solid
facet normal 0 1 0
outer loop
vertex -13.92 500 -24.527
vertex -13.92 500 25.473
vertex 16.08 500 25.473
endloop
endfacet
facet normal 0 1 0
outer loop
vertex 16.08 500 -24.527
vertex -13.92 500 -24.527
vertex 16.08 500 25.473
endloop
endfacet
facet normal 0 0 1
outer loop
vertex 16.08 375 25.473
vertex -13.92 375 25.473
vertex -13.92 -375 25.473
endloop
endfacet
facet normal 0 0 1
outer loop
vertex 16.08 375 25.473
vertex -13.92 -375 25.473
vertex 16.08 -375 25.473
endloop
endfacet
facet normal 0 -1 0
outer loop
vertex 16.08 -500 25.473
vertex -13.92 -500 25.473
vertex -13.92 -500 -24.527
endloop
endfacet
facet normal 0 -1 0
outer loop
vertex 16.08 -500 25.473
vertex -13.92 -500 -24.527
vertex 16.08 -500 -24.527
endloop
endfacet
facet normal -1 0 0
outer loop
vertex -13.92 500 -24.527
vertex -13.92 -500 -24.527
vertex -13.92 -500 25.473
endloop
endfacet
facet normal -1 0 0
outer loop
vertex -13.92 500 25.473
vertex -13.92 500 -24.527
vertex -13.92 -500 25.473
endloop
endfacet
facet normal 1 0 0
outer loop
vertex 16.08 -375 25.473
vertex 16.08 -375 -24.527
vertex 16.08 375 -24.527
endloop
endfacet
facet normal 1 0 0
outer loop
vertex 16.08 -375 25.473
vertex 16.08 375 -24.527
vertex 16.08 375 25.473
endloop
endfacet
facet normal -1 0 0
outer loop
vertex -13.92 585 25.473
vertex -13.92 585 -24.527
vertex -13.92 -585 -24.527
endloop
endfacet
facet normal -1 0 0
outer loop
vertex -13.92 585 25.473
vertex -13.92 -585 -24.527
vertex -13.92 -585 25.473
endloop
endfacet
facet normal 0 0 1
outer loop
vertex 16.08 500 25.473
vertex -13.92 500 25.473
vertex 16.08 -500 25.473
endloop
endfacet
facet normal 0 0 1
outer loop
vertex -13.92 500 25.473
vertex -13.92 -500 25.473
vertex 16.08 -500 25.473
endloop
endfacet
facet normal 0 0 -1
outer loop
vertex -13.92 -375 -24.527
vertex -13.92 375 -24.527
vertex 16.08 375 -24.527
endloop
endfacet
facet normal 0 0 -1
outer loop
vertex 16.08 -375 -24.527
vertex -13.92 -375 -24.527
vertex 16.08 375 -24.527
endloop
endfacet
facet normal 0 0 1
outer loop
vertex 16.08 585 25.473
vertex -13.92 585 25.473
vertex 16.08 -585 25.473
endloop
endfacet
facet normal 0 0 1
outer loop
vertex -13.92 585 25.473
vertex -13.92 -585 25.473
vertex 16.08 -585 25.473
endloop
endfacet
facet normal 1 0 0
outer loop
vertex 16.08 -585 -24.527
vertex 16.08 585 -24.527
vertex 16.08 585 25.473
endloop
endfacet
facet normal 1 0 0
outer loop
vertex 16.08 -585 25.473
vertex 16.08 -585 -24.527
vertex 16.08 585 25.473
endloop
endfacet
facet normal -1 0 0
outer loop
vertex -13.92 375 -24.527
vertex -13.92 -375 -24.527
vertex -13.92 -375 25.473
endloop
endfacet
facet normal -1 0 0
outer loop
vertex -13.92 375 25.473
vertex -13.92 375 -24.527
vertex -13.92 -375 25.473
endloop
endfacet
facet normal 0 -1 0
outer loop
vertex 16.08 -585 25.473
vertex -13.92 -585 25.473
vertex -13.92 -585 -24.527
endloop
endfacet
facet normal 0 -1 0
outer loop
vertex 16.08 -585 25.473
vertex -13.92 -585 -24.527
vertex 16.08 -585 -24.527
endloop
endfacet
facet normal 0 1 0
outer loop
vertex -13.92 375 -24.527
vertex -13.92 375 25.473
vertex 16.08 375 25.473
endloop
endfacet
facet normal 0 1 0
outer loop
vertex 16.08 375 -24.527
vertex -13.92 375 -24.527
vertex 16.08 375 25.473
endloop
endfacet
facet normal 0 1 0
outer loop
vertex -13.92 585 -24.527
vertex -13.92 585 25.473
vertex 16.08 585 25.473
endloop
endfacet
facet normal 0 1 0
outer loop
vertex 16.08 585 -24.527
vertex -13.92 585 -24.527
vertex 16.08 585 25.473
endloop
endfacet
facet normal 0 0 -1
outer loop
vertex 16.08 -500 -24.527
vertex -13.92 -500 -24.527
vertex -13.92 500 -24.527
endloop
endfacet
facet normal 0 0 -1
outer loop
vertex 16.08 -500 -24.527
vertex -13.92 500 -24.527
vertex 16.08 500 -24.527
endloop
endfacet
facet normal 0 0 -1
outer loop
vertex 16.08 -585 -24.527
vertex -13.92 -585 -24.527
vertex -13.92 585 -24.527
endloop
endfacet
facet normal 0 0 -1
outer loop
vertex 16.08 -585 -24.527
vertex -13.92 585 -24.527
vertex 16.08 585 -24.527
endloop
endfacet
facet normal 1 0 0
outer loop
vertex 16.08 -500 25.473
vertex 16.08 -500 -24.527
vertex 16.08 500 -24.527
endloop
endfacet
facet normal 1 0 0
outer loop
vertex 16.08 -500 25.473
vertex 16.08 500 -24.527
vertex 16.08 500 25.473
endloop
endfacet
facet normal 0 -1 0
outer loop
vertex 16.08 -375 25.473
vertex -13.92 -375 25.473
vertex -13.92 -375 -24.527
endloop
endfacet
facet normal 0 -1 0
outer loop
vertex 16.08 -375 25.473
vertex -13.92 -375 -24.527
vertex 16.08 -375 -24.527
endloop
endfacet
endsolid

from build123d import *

# Parameters (mm, degrees)
F0_W     = 30
F0_H     = 50
F1_DEPTH = 585
F2_DEPTH = 500
F3_DEPTH = 375


with BuildPart() as f1:
    # F0 (on Front) → F1 (new body, symmetric)
    with BuildSketch(Plane.XZ):
        with Locations((1.079545, 0.473484)):
            Rectangle(F0_W, F0_H)
    extrude(amount=F1_DEPTH, both=True)


with BuildPart() as f2:
    # F0 (on Front) → F2 (new body, symmetric)
    with BuildSketch(Plane.XZ):
        with Locations((1.079545, 0.473484)):
            Rectangle(F0_W, F0_H)
    extrude(amount=F2_DEPTH, both=True)


with BuildPart() as f3:
    # F0 (on Front) → F3 (new body, symmetric)
    with BuildSketch(Plane.XZ):
        with Locations((1.079545, 0.473484)):
            Rectangle(F0_W, F0_H)
    extrude(amount=F3_DEPTH, both=True)


solid = Compound([f1.part, f2.part, f3.part])
